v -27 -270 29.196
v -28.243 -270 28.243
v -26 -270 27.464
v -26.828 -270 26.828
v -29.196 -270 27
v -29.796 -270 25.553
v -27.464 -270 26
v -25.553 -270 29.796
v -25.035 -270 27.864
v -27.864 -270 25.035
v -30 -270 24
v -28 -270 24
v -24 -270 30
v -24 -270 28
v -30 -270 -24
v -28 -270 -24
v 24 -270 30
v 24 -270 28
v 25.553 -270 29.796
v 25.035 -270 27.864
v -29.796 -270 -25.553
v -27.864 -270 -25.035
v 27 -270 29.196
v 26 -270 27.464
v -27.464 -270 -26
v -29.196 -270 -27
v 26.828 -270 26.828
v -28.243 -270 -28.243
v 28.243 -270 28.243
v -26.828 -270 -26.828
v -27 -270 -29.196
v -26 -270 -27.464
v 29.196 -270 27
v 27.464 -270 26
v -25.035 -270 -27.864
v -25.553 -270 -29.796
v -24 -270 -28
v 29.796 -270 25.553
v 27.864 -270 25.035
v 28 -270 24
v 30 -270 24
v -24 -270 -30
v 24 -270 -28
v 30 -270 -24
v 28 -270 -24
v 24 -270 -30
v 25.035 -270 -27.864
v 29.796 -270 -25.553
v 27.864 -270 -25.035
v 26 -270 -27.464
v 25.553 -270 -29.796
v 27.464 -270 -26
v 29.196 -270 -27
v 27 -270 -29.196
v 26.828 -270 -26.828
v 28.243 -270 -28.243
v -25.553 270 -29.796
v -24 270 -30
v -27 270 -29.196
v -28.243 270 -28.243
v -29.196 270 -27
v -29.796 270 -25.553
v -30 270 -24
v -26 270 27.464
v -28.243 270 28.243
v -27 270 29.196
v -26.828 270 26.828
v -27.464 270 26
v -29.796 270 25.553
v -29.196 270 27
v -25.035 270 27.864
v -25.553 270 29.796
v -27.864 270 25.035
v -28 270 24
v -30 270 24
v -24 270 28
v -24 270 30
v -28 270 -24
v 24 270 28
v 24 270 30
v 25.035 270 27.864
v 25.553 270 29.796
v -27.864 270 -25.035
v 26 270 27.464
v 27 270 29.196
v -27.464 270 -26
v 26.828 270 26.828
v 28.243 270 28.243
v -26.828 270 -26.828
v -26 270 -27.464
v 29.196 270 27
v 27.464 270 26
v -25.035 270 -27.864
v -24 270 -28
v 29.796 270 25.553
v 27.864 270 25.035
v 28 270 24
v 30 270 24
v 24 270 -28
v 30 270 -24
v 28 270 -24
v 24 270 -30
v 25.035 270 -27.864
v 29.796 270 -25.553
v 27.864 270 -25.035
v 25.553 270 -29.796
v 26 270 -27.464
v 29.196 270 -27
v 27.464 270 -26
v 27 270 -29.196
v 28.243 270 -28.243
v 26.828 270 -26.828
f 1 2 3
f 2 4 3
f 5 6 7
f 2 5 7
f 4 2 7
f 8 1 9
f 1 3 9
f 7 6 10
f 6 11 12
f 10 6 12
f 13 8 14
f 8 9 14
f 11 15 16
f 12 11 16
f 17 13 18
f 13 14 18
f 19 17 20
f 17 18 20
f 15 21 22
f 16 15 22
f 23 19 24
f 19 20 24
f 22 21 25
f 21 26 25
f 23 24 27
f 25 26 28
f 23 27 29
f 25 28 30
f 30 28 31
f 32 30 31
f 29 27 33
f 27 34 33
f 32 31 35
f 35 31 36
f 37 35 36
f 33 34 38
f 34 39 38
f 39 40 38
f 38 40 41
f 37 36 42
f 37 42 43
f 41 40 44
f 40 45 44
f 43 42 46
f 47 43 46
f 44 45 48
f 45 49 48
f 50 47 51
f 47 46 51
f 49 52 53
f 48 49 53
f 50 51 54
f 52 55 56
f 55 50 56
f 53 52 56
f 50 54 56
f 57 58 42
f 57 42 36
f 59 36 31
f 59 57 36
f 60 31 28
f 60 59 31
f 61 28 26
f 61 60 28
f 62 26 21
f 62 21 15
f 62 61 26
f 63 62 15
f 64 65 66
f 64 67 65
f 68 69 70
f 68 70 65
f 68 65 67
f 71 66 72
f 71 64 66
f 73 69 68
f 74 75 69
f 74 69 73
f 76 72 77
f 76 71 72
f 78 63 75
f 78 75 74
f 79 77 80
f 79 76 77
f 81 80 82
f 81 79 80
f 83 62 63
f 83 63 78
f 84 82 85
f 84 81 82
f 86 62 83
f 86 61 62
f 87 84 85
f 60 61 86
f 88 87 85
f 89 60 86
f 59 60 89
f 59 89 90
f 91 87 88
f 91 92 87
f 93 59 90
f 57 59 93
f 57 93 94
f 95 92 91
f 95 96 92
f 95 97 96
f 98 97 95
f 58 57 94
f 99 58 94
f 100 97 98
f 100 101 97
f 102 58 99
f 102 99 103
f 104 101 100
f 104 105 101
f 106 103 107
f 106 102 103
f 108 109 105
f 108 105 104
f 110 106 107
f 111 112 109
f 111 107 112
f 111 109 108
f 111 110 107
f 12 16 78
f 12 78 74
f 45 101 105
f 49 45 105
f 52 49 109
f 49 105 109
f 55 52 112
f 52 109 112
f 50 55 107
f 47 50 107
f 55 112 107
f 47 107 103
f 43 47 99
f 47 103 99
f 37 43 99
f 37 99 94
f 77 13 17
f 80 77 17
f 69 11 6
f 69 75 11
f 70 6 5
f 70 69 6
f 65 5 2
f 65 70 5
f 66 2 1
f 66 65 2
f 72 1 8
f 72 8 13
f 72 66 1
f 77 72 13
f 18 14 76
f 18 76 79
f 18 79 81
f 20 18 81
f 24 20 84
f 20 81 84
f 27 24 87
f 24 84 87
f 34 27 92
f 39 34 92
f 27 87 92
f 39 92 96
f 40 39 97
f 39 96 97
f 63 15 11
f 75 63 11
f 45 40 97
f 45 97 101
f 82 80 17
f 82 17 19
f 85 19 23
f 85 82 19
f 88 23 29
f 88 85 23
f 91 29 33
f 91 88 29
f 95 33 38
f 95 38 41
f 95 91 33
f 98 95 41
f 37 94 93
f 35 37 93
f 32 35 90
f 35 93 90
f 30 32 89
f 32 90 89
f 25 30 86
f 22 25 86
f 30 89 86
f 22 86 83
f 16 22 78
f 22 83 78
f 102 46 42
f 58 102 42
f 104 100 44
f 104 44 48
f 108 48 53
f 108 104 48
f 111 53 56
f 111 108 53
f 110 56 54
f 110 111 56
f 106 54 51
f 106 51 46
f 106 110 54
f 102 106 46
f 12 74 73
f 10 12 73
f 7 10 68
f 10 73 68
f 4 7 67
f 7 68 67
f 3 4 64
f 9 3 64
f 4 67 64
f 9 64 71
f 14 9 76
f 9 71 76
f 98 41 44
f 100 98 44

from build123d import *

# Parameters (mm, degrees)
BOSS_EXTRUDE1_DEPTH = 270
SHELL1_T            = -2


with BuildPart() as part:
    # Sketch1 → Boss-Extrude1 (new, symmetric)
    with BuildSketch(Plane(origin=(0, 0, 0), x_dir=(1, 0, 0), z_dir=(0, 1, 0))):
        with BuildLine():
            Line((-24, -30), (24, -30))
            ThreePointArc((24, -30), (28.242640687, -28.242640687), (30, -24))
            Line((30, -24), (30, 24))
            ThreePointArc((30, 24), (28.242640687, 28.242640687), (24, 30))
            Line((24, 30), (-24, 30))
            ThreePointArc((-24, 30), (-28.242640687, 28.242640687), (-30, 24))
            Line((-30, 24), (-30, -24))
            ThreePointArc((-30, -24), (-28.242640687, -28.242640687), (-24, -30))
        make_face()
    extrude(amount=BOSS_EXTRUDE1_DEPTH, both=True)

    # Shell1
    shell1_openings = [part.faces().sort_by_distance(p)[0] for p in [
        (0, 270, 0),
        (0, -270, 0),
    ]]
    offset(amount=SHELL1_T, openings=shell1_openings, kind=Kind.INTERSECTION)


solid = part.part
